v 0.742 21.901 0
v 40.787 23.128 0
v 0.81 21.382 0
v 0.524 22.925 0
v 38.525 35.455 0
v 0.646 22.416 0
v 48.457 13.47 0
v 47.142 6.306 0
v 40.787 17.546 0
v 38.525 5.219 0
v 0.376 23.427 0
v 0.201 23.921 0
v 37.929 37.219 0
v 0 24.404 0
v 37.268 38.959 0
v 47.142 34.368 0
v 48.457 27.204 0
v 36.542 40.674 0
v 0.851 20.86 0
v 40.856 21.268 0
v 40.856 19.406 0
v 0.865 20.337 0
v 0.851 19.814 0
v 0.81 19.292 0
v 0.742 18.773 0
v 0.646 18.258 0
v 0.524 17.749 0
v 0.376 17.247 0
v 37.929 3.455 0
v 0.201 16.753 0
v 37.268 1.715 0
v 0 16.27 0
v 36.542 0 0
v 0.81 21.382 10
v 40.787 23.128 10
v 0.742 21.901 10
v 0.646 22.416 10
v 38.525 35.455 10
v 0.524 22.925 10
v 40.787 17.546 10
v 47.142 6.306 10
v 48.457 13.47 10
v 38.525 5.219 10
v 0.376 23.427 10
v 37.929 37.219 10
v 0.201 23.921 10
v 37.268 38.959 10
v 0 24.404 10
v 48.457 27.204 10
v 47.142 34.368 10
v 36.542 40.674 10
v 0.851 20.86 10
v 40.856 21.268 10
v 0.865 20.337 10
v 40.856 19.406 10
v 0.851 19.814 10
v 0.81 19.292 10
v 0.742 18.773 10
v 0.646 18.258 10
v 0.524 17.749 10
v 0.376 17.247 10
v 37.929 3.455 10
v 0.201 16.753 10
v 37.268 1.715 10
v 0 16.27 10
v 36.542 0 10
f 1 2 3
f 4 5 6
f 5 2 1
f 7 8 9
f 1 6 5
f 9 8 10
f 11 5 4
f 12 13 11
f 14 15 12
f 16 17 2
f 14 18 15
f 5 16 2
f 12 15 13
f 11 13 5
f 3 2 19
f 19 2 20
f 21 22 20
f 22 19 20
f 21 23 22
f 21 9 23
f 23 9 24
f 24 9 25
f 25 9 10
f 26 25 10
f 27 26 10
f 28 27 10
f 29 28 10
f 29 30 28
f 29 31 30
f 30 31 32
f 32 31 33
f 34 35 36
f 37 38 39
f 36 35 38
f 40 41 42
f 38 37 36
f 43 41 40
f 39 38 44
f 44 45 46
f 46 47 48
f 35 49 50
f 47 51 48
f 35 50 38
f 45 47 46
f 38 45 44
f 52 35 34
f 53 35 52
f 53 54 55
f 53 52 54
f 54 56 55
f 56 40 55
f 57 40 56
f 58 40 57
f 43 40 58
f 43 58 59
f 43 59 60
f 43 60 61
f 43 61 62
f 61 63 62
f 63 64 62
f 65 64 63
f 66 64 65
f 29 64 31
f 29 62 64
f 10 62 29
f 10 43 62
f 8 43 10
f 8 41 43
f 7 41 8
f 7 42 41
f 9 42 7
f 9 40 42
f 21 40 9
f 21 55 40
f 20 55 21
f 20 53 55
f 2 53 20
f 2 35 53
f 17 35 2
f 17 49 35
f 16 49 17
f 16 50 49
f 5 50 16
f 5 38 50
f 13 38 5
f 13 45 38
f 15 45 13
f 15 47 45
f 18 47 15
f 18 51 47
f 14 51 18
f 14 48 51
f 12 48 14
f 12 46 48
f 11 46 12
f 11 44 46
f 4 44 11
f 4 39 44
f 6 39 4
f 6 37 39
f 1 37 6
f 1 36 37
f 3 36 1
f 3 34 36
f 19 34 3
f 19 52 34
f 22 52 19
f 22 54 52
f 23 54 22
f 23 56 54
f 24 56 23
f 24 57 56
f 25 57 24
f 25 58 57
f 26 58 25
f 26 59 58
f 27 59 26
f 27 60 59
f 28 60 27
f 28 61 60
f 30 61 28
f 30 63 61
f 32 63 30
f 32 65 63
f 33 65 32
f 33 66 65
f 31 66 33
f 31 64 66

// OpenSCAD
$fn = 32;

// ----------------------------------------------------------------------
// Gear sector: 2 teeth on 48 degrees
// ----------------------------------------------------------------------

// --- parameters (mm) ---
sector_angle = 48;        // sector angle, degrees
root_r = 50;              // root circle radius
tooth_h = 8;              // tooth height over the root circle
teeth = 2;                // number of teeth on the sector
hub_r = 10;               // hub bore radius
plate_t = 10;             // sector thickness, Z
arc_step = 3;             // sampling step of the root/hub arcs, degrees
fit_tol = 0.02;           // declared fit tolerance (prompt contract)
free_tol = 0.2;           // declared free tolerance (prompt contract)

tip_r = root_r + tooth_h;  // tip circle radius

profile = [[36.542, 0], [37.268, 1.715], [37.929, 3.455], [38.525, 5.219], [47.142, 6.306], [48.457, 13.47], [40.787, 17.546], [40.856, 19.406], [40.856, 21.268], [40.787, 23.128], [48.457, 27.204], [47.142, 34.368], [38.525, 35.455], [37.929, 37.219], [37.268, 38.959], [36.542, 40.674], [0, 24.404], [0.201, 23.921], [0.376, 23.427], [0.524, 22.925], [0.646, 22.416], [0.742, 21.901], [0.81, 21.382], [0.851, 20.86], [0.865, 20.337], [0.851, 19.814], [0.81, 19.292], [0.742, 18.773], [0.646, 18.258], [0.524, 17.749], [0.376, 17.247], [0.201, 16.753], [0, 16.27]];  // primary outline, 33 points, counter clockwise

// --- the one profile operation ---
linear_extrude(height = plate_t) polygon(points = profile);
